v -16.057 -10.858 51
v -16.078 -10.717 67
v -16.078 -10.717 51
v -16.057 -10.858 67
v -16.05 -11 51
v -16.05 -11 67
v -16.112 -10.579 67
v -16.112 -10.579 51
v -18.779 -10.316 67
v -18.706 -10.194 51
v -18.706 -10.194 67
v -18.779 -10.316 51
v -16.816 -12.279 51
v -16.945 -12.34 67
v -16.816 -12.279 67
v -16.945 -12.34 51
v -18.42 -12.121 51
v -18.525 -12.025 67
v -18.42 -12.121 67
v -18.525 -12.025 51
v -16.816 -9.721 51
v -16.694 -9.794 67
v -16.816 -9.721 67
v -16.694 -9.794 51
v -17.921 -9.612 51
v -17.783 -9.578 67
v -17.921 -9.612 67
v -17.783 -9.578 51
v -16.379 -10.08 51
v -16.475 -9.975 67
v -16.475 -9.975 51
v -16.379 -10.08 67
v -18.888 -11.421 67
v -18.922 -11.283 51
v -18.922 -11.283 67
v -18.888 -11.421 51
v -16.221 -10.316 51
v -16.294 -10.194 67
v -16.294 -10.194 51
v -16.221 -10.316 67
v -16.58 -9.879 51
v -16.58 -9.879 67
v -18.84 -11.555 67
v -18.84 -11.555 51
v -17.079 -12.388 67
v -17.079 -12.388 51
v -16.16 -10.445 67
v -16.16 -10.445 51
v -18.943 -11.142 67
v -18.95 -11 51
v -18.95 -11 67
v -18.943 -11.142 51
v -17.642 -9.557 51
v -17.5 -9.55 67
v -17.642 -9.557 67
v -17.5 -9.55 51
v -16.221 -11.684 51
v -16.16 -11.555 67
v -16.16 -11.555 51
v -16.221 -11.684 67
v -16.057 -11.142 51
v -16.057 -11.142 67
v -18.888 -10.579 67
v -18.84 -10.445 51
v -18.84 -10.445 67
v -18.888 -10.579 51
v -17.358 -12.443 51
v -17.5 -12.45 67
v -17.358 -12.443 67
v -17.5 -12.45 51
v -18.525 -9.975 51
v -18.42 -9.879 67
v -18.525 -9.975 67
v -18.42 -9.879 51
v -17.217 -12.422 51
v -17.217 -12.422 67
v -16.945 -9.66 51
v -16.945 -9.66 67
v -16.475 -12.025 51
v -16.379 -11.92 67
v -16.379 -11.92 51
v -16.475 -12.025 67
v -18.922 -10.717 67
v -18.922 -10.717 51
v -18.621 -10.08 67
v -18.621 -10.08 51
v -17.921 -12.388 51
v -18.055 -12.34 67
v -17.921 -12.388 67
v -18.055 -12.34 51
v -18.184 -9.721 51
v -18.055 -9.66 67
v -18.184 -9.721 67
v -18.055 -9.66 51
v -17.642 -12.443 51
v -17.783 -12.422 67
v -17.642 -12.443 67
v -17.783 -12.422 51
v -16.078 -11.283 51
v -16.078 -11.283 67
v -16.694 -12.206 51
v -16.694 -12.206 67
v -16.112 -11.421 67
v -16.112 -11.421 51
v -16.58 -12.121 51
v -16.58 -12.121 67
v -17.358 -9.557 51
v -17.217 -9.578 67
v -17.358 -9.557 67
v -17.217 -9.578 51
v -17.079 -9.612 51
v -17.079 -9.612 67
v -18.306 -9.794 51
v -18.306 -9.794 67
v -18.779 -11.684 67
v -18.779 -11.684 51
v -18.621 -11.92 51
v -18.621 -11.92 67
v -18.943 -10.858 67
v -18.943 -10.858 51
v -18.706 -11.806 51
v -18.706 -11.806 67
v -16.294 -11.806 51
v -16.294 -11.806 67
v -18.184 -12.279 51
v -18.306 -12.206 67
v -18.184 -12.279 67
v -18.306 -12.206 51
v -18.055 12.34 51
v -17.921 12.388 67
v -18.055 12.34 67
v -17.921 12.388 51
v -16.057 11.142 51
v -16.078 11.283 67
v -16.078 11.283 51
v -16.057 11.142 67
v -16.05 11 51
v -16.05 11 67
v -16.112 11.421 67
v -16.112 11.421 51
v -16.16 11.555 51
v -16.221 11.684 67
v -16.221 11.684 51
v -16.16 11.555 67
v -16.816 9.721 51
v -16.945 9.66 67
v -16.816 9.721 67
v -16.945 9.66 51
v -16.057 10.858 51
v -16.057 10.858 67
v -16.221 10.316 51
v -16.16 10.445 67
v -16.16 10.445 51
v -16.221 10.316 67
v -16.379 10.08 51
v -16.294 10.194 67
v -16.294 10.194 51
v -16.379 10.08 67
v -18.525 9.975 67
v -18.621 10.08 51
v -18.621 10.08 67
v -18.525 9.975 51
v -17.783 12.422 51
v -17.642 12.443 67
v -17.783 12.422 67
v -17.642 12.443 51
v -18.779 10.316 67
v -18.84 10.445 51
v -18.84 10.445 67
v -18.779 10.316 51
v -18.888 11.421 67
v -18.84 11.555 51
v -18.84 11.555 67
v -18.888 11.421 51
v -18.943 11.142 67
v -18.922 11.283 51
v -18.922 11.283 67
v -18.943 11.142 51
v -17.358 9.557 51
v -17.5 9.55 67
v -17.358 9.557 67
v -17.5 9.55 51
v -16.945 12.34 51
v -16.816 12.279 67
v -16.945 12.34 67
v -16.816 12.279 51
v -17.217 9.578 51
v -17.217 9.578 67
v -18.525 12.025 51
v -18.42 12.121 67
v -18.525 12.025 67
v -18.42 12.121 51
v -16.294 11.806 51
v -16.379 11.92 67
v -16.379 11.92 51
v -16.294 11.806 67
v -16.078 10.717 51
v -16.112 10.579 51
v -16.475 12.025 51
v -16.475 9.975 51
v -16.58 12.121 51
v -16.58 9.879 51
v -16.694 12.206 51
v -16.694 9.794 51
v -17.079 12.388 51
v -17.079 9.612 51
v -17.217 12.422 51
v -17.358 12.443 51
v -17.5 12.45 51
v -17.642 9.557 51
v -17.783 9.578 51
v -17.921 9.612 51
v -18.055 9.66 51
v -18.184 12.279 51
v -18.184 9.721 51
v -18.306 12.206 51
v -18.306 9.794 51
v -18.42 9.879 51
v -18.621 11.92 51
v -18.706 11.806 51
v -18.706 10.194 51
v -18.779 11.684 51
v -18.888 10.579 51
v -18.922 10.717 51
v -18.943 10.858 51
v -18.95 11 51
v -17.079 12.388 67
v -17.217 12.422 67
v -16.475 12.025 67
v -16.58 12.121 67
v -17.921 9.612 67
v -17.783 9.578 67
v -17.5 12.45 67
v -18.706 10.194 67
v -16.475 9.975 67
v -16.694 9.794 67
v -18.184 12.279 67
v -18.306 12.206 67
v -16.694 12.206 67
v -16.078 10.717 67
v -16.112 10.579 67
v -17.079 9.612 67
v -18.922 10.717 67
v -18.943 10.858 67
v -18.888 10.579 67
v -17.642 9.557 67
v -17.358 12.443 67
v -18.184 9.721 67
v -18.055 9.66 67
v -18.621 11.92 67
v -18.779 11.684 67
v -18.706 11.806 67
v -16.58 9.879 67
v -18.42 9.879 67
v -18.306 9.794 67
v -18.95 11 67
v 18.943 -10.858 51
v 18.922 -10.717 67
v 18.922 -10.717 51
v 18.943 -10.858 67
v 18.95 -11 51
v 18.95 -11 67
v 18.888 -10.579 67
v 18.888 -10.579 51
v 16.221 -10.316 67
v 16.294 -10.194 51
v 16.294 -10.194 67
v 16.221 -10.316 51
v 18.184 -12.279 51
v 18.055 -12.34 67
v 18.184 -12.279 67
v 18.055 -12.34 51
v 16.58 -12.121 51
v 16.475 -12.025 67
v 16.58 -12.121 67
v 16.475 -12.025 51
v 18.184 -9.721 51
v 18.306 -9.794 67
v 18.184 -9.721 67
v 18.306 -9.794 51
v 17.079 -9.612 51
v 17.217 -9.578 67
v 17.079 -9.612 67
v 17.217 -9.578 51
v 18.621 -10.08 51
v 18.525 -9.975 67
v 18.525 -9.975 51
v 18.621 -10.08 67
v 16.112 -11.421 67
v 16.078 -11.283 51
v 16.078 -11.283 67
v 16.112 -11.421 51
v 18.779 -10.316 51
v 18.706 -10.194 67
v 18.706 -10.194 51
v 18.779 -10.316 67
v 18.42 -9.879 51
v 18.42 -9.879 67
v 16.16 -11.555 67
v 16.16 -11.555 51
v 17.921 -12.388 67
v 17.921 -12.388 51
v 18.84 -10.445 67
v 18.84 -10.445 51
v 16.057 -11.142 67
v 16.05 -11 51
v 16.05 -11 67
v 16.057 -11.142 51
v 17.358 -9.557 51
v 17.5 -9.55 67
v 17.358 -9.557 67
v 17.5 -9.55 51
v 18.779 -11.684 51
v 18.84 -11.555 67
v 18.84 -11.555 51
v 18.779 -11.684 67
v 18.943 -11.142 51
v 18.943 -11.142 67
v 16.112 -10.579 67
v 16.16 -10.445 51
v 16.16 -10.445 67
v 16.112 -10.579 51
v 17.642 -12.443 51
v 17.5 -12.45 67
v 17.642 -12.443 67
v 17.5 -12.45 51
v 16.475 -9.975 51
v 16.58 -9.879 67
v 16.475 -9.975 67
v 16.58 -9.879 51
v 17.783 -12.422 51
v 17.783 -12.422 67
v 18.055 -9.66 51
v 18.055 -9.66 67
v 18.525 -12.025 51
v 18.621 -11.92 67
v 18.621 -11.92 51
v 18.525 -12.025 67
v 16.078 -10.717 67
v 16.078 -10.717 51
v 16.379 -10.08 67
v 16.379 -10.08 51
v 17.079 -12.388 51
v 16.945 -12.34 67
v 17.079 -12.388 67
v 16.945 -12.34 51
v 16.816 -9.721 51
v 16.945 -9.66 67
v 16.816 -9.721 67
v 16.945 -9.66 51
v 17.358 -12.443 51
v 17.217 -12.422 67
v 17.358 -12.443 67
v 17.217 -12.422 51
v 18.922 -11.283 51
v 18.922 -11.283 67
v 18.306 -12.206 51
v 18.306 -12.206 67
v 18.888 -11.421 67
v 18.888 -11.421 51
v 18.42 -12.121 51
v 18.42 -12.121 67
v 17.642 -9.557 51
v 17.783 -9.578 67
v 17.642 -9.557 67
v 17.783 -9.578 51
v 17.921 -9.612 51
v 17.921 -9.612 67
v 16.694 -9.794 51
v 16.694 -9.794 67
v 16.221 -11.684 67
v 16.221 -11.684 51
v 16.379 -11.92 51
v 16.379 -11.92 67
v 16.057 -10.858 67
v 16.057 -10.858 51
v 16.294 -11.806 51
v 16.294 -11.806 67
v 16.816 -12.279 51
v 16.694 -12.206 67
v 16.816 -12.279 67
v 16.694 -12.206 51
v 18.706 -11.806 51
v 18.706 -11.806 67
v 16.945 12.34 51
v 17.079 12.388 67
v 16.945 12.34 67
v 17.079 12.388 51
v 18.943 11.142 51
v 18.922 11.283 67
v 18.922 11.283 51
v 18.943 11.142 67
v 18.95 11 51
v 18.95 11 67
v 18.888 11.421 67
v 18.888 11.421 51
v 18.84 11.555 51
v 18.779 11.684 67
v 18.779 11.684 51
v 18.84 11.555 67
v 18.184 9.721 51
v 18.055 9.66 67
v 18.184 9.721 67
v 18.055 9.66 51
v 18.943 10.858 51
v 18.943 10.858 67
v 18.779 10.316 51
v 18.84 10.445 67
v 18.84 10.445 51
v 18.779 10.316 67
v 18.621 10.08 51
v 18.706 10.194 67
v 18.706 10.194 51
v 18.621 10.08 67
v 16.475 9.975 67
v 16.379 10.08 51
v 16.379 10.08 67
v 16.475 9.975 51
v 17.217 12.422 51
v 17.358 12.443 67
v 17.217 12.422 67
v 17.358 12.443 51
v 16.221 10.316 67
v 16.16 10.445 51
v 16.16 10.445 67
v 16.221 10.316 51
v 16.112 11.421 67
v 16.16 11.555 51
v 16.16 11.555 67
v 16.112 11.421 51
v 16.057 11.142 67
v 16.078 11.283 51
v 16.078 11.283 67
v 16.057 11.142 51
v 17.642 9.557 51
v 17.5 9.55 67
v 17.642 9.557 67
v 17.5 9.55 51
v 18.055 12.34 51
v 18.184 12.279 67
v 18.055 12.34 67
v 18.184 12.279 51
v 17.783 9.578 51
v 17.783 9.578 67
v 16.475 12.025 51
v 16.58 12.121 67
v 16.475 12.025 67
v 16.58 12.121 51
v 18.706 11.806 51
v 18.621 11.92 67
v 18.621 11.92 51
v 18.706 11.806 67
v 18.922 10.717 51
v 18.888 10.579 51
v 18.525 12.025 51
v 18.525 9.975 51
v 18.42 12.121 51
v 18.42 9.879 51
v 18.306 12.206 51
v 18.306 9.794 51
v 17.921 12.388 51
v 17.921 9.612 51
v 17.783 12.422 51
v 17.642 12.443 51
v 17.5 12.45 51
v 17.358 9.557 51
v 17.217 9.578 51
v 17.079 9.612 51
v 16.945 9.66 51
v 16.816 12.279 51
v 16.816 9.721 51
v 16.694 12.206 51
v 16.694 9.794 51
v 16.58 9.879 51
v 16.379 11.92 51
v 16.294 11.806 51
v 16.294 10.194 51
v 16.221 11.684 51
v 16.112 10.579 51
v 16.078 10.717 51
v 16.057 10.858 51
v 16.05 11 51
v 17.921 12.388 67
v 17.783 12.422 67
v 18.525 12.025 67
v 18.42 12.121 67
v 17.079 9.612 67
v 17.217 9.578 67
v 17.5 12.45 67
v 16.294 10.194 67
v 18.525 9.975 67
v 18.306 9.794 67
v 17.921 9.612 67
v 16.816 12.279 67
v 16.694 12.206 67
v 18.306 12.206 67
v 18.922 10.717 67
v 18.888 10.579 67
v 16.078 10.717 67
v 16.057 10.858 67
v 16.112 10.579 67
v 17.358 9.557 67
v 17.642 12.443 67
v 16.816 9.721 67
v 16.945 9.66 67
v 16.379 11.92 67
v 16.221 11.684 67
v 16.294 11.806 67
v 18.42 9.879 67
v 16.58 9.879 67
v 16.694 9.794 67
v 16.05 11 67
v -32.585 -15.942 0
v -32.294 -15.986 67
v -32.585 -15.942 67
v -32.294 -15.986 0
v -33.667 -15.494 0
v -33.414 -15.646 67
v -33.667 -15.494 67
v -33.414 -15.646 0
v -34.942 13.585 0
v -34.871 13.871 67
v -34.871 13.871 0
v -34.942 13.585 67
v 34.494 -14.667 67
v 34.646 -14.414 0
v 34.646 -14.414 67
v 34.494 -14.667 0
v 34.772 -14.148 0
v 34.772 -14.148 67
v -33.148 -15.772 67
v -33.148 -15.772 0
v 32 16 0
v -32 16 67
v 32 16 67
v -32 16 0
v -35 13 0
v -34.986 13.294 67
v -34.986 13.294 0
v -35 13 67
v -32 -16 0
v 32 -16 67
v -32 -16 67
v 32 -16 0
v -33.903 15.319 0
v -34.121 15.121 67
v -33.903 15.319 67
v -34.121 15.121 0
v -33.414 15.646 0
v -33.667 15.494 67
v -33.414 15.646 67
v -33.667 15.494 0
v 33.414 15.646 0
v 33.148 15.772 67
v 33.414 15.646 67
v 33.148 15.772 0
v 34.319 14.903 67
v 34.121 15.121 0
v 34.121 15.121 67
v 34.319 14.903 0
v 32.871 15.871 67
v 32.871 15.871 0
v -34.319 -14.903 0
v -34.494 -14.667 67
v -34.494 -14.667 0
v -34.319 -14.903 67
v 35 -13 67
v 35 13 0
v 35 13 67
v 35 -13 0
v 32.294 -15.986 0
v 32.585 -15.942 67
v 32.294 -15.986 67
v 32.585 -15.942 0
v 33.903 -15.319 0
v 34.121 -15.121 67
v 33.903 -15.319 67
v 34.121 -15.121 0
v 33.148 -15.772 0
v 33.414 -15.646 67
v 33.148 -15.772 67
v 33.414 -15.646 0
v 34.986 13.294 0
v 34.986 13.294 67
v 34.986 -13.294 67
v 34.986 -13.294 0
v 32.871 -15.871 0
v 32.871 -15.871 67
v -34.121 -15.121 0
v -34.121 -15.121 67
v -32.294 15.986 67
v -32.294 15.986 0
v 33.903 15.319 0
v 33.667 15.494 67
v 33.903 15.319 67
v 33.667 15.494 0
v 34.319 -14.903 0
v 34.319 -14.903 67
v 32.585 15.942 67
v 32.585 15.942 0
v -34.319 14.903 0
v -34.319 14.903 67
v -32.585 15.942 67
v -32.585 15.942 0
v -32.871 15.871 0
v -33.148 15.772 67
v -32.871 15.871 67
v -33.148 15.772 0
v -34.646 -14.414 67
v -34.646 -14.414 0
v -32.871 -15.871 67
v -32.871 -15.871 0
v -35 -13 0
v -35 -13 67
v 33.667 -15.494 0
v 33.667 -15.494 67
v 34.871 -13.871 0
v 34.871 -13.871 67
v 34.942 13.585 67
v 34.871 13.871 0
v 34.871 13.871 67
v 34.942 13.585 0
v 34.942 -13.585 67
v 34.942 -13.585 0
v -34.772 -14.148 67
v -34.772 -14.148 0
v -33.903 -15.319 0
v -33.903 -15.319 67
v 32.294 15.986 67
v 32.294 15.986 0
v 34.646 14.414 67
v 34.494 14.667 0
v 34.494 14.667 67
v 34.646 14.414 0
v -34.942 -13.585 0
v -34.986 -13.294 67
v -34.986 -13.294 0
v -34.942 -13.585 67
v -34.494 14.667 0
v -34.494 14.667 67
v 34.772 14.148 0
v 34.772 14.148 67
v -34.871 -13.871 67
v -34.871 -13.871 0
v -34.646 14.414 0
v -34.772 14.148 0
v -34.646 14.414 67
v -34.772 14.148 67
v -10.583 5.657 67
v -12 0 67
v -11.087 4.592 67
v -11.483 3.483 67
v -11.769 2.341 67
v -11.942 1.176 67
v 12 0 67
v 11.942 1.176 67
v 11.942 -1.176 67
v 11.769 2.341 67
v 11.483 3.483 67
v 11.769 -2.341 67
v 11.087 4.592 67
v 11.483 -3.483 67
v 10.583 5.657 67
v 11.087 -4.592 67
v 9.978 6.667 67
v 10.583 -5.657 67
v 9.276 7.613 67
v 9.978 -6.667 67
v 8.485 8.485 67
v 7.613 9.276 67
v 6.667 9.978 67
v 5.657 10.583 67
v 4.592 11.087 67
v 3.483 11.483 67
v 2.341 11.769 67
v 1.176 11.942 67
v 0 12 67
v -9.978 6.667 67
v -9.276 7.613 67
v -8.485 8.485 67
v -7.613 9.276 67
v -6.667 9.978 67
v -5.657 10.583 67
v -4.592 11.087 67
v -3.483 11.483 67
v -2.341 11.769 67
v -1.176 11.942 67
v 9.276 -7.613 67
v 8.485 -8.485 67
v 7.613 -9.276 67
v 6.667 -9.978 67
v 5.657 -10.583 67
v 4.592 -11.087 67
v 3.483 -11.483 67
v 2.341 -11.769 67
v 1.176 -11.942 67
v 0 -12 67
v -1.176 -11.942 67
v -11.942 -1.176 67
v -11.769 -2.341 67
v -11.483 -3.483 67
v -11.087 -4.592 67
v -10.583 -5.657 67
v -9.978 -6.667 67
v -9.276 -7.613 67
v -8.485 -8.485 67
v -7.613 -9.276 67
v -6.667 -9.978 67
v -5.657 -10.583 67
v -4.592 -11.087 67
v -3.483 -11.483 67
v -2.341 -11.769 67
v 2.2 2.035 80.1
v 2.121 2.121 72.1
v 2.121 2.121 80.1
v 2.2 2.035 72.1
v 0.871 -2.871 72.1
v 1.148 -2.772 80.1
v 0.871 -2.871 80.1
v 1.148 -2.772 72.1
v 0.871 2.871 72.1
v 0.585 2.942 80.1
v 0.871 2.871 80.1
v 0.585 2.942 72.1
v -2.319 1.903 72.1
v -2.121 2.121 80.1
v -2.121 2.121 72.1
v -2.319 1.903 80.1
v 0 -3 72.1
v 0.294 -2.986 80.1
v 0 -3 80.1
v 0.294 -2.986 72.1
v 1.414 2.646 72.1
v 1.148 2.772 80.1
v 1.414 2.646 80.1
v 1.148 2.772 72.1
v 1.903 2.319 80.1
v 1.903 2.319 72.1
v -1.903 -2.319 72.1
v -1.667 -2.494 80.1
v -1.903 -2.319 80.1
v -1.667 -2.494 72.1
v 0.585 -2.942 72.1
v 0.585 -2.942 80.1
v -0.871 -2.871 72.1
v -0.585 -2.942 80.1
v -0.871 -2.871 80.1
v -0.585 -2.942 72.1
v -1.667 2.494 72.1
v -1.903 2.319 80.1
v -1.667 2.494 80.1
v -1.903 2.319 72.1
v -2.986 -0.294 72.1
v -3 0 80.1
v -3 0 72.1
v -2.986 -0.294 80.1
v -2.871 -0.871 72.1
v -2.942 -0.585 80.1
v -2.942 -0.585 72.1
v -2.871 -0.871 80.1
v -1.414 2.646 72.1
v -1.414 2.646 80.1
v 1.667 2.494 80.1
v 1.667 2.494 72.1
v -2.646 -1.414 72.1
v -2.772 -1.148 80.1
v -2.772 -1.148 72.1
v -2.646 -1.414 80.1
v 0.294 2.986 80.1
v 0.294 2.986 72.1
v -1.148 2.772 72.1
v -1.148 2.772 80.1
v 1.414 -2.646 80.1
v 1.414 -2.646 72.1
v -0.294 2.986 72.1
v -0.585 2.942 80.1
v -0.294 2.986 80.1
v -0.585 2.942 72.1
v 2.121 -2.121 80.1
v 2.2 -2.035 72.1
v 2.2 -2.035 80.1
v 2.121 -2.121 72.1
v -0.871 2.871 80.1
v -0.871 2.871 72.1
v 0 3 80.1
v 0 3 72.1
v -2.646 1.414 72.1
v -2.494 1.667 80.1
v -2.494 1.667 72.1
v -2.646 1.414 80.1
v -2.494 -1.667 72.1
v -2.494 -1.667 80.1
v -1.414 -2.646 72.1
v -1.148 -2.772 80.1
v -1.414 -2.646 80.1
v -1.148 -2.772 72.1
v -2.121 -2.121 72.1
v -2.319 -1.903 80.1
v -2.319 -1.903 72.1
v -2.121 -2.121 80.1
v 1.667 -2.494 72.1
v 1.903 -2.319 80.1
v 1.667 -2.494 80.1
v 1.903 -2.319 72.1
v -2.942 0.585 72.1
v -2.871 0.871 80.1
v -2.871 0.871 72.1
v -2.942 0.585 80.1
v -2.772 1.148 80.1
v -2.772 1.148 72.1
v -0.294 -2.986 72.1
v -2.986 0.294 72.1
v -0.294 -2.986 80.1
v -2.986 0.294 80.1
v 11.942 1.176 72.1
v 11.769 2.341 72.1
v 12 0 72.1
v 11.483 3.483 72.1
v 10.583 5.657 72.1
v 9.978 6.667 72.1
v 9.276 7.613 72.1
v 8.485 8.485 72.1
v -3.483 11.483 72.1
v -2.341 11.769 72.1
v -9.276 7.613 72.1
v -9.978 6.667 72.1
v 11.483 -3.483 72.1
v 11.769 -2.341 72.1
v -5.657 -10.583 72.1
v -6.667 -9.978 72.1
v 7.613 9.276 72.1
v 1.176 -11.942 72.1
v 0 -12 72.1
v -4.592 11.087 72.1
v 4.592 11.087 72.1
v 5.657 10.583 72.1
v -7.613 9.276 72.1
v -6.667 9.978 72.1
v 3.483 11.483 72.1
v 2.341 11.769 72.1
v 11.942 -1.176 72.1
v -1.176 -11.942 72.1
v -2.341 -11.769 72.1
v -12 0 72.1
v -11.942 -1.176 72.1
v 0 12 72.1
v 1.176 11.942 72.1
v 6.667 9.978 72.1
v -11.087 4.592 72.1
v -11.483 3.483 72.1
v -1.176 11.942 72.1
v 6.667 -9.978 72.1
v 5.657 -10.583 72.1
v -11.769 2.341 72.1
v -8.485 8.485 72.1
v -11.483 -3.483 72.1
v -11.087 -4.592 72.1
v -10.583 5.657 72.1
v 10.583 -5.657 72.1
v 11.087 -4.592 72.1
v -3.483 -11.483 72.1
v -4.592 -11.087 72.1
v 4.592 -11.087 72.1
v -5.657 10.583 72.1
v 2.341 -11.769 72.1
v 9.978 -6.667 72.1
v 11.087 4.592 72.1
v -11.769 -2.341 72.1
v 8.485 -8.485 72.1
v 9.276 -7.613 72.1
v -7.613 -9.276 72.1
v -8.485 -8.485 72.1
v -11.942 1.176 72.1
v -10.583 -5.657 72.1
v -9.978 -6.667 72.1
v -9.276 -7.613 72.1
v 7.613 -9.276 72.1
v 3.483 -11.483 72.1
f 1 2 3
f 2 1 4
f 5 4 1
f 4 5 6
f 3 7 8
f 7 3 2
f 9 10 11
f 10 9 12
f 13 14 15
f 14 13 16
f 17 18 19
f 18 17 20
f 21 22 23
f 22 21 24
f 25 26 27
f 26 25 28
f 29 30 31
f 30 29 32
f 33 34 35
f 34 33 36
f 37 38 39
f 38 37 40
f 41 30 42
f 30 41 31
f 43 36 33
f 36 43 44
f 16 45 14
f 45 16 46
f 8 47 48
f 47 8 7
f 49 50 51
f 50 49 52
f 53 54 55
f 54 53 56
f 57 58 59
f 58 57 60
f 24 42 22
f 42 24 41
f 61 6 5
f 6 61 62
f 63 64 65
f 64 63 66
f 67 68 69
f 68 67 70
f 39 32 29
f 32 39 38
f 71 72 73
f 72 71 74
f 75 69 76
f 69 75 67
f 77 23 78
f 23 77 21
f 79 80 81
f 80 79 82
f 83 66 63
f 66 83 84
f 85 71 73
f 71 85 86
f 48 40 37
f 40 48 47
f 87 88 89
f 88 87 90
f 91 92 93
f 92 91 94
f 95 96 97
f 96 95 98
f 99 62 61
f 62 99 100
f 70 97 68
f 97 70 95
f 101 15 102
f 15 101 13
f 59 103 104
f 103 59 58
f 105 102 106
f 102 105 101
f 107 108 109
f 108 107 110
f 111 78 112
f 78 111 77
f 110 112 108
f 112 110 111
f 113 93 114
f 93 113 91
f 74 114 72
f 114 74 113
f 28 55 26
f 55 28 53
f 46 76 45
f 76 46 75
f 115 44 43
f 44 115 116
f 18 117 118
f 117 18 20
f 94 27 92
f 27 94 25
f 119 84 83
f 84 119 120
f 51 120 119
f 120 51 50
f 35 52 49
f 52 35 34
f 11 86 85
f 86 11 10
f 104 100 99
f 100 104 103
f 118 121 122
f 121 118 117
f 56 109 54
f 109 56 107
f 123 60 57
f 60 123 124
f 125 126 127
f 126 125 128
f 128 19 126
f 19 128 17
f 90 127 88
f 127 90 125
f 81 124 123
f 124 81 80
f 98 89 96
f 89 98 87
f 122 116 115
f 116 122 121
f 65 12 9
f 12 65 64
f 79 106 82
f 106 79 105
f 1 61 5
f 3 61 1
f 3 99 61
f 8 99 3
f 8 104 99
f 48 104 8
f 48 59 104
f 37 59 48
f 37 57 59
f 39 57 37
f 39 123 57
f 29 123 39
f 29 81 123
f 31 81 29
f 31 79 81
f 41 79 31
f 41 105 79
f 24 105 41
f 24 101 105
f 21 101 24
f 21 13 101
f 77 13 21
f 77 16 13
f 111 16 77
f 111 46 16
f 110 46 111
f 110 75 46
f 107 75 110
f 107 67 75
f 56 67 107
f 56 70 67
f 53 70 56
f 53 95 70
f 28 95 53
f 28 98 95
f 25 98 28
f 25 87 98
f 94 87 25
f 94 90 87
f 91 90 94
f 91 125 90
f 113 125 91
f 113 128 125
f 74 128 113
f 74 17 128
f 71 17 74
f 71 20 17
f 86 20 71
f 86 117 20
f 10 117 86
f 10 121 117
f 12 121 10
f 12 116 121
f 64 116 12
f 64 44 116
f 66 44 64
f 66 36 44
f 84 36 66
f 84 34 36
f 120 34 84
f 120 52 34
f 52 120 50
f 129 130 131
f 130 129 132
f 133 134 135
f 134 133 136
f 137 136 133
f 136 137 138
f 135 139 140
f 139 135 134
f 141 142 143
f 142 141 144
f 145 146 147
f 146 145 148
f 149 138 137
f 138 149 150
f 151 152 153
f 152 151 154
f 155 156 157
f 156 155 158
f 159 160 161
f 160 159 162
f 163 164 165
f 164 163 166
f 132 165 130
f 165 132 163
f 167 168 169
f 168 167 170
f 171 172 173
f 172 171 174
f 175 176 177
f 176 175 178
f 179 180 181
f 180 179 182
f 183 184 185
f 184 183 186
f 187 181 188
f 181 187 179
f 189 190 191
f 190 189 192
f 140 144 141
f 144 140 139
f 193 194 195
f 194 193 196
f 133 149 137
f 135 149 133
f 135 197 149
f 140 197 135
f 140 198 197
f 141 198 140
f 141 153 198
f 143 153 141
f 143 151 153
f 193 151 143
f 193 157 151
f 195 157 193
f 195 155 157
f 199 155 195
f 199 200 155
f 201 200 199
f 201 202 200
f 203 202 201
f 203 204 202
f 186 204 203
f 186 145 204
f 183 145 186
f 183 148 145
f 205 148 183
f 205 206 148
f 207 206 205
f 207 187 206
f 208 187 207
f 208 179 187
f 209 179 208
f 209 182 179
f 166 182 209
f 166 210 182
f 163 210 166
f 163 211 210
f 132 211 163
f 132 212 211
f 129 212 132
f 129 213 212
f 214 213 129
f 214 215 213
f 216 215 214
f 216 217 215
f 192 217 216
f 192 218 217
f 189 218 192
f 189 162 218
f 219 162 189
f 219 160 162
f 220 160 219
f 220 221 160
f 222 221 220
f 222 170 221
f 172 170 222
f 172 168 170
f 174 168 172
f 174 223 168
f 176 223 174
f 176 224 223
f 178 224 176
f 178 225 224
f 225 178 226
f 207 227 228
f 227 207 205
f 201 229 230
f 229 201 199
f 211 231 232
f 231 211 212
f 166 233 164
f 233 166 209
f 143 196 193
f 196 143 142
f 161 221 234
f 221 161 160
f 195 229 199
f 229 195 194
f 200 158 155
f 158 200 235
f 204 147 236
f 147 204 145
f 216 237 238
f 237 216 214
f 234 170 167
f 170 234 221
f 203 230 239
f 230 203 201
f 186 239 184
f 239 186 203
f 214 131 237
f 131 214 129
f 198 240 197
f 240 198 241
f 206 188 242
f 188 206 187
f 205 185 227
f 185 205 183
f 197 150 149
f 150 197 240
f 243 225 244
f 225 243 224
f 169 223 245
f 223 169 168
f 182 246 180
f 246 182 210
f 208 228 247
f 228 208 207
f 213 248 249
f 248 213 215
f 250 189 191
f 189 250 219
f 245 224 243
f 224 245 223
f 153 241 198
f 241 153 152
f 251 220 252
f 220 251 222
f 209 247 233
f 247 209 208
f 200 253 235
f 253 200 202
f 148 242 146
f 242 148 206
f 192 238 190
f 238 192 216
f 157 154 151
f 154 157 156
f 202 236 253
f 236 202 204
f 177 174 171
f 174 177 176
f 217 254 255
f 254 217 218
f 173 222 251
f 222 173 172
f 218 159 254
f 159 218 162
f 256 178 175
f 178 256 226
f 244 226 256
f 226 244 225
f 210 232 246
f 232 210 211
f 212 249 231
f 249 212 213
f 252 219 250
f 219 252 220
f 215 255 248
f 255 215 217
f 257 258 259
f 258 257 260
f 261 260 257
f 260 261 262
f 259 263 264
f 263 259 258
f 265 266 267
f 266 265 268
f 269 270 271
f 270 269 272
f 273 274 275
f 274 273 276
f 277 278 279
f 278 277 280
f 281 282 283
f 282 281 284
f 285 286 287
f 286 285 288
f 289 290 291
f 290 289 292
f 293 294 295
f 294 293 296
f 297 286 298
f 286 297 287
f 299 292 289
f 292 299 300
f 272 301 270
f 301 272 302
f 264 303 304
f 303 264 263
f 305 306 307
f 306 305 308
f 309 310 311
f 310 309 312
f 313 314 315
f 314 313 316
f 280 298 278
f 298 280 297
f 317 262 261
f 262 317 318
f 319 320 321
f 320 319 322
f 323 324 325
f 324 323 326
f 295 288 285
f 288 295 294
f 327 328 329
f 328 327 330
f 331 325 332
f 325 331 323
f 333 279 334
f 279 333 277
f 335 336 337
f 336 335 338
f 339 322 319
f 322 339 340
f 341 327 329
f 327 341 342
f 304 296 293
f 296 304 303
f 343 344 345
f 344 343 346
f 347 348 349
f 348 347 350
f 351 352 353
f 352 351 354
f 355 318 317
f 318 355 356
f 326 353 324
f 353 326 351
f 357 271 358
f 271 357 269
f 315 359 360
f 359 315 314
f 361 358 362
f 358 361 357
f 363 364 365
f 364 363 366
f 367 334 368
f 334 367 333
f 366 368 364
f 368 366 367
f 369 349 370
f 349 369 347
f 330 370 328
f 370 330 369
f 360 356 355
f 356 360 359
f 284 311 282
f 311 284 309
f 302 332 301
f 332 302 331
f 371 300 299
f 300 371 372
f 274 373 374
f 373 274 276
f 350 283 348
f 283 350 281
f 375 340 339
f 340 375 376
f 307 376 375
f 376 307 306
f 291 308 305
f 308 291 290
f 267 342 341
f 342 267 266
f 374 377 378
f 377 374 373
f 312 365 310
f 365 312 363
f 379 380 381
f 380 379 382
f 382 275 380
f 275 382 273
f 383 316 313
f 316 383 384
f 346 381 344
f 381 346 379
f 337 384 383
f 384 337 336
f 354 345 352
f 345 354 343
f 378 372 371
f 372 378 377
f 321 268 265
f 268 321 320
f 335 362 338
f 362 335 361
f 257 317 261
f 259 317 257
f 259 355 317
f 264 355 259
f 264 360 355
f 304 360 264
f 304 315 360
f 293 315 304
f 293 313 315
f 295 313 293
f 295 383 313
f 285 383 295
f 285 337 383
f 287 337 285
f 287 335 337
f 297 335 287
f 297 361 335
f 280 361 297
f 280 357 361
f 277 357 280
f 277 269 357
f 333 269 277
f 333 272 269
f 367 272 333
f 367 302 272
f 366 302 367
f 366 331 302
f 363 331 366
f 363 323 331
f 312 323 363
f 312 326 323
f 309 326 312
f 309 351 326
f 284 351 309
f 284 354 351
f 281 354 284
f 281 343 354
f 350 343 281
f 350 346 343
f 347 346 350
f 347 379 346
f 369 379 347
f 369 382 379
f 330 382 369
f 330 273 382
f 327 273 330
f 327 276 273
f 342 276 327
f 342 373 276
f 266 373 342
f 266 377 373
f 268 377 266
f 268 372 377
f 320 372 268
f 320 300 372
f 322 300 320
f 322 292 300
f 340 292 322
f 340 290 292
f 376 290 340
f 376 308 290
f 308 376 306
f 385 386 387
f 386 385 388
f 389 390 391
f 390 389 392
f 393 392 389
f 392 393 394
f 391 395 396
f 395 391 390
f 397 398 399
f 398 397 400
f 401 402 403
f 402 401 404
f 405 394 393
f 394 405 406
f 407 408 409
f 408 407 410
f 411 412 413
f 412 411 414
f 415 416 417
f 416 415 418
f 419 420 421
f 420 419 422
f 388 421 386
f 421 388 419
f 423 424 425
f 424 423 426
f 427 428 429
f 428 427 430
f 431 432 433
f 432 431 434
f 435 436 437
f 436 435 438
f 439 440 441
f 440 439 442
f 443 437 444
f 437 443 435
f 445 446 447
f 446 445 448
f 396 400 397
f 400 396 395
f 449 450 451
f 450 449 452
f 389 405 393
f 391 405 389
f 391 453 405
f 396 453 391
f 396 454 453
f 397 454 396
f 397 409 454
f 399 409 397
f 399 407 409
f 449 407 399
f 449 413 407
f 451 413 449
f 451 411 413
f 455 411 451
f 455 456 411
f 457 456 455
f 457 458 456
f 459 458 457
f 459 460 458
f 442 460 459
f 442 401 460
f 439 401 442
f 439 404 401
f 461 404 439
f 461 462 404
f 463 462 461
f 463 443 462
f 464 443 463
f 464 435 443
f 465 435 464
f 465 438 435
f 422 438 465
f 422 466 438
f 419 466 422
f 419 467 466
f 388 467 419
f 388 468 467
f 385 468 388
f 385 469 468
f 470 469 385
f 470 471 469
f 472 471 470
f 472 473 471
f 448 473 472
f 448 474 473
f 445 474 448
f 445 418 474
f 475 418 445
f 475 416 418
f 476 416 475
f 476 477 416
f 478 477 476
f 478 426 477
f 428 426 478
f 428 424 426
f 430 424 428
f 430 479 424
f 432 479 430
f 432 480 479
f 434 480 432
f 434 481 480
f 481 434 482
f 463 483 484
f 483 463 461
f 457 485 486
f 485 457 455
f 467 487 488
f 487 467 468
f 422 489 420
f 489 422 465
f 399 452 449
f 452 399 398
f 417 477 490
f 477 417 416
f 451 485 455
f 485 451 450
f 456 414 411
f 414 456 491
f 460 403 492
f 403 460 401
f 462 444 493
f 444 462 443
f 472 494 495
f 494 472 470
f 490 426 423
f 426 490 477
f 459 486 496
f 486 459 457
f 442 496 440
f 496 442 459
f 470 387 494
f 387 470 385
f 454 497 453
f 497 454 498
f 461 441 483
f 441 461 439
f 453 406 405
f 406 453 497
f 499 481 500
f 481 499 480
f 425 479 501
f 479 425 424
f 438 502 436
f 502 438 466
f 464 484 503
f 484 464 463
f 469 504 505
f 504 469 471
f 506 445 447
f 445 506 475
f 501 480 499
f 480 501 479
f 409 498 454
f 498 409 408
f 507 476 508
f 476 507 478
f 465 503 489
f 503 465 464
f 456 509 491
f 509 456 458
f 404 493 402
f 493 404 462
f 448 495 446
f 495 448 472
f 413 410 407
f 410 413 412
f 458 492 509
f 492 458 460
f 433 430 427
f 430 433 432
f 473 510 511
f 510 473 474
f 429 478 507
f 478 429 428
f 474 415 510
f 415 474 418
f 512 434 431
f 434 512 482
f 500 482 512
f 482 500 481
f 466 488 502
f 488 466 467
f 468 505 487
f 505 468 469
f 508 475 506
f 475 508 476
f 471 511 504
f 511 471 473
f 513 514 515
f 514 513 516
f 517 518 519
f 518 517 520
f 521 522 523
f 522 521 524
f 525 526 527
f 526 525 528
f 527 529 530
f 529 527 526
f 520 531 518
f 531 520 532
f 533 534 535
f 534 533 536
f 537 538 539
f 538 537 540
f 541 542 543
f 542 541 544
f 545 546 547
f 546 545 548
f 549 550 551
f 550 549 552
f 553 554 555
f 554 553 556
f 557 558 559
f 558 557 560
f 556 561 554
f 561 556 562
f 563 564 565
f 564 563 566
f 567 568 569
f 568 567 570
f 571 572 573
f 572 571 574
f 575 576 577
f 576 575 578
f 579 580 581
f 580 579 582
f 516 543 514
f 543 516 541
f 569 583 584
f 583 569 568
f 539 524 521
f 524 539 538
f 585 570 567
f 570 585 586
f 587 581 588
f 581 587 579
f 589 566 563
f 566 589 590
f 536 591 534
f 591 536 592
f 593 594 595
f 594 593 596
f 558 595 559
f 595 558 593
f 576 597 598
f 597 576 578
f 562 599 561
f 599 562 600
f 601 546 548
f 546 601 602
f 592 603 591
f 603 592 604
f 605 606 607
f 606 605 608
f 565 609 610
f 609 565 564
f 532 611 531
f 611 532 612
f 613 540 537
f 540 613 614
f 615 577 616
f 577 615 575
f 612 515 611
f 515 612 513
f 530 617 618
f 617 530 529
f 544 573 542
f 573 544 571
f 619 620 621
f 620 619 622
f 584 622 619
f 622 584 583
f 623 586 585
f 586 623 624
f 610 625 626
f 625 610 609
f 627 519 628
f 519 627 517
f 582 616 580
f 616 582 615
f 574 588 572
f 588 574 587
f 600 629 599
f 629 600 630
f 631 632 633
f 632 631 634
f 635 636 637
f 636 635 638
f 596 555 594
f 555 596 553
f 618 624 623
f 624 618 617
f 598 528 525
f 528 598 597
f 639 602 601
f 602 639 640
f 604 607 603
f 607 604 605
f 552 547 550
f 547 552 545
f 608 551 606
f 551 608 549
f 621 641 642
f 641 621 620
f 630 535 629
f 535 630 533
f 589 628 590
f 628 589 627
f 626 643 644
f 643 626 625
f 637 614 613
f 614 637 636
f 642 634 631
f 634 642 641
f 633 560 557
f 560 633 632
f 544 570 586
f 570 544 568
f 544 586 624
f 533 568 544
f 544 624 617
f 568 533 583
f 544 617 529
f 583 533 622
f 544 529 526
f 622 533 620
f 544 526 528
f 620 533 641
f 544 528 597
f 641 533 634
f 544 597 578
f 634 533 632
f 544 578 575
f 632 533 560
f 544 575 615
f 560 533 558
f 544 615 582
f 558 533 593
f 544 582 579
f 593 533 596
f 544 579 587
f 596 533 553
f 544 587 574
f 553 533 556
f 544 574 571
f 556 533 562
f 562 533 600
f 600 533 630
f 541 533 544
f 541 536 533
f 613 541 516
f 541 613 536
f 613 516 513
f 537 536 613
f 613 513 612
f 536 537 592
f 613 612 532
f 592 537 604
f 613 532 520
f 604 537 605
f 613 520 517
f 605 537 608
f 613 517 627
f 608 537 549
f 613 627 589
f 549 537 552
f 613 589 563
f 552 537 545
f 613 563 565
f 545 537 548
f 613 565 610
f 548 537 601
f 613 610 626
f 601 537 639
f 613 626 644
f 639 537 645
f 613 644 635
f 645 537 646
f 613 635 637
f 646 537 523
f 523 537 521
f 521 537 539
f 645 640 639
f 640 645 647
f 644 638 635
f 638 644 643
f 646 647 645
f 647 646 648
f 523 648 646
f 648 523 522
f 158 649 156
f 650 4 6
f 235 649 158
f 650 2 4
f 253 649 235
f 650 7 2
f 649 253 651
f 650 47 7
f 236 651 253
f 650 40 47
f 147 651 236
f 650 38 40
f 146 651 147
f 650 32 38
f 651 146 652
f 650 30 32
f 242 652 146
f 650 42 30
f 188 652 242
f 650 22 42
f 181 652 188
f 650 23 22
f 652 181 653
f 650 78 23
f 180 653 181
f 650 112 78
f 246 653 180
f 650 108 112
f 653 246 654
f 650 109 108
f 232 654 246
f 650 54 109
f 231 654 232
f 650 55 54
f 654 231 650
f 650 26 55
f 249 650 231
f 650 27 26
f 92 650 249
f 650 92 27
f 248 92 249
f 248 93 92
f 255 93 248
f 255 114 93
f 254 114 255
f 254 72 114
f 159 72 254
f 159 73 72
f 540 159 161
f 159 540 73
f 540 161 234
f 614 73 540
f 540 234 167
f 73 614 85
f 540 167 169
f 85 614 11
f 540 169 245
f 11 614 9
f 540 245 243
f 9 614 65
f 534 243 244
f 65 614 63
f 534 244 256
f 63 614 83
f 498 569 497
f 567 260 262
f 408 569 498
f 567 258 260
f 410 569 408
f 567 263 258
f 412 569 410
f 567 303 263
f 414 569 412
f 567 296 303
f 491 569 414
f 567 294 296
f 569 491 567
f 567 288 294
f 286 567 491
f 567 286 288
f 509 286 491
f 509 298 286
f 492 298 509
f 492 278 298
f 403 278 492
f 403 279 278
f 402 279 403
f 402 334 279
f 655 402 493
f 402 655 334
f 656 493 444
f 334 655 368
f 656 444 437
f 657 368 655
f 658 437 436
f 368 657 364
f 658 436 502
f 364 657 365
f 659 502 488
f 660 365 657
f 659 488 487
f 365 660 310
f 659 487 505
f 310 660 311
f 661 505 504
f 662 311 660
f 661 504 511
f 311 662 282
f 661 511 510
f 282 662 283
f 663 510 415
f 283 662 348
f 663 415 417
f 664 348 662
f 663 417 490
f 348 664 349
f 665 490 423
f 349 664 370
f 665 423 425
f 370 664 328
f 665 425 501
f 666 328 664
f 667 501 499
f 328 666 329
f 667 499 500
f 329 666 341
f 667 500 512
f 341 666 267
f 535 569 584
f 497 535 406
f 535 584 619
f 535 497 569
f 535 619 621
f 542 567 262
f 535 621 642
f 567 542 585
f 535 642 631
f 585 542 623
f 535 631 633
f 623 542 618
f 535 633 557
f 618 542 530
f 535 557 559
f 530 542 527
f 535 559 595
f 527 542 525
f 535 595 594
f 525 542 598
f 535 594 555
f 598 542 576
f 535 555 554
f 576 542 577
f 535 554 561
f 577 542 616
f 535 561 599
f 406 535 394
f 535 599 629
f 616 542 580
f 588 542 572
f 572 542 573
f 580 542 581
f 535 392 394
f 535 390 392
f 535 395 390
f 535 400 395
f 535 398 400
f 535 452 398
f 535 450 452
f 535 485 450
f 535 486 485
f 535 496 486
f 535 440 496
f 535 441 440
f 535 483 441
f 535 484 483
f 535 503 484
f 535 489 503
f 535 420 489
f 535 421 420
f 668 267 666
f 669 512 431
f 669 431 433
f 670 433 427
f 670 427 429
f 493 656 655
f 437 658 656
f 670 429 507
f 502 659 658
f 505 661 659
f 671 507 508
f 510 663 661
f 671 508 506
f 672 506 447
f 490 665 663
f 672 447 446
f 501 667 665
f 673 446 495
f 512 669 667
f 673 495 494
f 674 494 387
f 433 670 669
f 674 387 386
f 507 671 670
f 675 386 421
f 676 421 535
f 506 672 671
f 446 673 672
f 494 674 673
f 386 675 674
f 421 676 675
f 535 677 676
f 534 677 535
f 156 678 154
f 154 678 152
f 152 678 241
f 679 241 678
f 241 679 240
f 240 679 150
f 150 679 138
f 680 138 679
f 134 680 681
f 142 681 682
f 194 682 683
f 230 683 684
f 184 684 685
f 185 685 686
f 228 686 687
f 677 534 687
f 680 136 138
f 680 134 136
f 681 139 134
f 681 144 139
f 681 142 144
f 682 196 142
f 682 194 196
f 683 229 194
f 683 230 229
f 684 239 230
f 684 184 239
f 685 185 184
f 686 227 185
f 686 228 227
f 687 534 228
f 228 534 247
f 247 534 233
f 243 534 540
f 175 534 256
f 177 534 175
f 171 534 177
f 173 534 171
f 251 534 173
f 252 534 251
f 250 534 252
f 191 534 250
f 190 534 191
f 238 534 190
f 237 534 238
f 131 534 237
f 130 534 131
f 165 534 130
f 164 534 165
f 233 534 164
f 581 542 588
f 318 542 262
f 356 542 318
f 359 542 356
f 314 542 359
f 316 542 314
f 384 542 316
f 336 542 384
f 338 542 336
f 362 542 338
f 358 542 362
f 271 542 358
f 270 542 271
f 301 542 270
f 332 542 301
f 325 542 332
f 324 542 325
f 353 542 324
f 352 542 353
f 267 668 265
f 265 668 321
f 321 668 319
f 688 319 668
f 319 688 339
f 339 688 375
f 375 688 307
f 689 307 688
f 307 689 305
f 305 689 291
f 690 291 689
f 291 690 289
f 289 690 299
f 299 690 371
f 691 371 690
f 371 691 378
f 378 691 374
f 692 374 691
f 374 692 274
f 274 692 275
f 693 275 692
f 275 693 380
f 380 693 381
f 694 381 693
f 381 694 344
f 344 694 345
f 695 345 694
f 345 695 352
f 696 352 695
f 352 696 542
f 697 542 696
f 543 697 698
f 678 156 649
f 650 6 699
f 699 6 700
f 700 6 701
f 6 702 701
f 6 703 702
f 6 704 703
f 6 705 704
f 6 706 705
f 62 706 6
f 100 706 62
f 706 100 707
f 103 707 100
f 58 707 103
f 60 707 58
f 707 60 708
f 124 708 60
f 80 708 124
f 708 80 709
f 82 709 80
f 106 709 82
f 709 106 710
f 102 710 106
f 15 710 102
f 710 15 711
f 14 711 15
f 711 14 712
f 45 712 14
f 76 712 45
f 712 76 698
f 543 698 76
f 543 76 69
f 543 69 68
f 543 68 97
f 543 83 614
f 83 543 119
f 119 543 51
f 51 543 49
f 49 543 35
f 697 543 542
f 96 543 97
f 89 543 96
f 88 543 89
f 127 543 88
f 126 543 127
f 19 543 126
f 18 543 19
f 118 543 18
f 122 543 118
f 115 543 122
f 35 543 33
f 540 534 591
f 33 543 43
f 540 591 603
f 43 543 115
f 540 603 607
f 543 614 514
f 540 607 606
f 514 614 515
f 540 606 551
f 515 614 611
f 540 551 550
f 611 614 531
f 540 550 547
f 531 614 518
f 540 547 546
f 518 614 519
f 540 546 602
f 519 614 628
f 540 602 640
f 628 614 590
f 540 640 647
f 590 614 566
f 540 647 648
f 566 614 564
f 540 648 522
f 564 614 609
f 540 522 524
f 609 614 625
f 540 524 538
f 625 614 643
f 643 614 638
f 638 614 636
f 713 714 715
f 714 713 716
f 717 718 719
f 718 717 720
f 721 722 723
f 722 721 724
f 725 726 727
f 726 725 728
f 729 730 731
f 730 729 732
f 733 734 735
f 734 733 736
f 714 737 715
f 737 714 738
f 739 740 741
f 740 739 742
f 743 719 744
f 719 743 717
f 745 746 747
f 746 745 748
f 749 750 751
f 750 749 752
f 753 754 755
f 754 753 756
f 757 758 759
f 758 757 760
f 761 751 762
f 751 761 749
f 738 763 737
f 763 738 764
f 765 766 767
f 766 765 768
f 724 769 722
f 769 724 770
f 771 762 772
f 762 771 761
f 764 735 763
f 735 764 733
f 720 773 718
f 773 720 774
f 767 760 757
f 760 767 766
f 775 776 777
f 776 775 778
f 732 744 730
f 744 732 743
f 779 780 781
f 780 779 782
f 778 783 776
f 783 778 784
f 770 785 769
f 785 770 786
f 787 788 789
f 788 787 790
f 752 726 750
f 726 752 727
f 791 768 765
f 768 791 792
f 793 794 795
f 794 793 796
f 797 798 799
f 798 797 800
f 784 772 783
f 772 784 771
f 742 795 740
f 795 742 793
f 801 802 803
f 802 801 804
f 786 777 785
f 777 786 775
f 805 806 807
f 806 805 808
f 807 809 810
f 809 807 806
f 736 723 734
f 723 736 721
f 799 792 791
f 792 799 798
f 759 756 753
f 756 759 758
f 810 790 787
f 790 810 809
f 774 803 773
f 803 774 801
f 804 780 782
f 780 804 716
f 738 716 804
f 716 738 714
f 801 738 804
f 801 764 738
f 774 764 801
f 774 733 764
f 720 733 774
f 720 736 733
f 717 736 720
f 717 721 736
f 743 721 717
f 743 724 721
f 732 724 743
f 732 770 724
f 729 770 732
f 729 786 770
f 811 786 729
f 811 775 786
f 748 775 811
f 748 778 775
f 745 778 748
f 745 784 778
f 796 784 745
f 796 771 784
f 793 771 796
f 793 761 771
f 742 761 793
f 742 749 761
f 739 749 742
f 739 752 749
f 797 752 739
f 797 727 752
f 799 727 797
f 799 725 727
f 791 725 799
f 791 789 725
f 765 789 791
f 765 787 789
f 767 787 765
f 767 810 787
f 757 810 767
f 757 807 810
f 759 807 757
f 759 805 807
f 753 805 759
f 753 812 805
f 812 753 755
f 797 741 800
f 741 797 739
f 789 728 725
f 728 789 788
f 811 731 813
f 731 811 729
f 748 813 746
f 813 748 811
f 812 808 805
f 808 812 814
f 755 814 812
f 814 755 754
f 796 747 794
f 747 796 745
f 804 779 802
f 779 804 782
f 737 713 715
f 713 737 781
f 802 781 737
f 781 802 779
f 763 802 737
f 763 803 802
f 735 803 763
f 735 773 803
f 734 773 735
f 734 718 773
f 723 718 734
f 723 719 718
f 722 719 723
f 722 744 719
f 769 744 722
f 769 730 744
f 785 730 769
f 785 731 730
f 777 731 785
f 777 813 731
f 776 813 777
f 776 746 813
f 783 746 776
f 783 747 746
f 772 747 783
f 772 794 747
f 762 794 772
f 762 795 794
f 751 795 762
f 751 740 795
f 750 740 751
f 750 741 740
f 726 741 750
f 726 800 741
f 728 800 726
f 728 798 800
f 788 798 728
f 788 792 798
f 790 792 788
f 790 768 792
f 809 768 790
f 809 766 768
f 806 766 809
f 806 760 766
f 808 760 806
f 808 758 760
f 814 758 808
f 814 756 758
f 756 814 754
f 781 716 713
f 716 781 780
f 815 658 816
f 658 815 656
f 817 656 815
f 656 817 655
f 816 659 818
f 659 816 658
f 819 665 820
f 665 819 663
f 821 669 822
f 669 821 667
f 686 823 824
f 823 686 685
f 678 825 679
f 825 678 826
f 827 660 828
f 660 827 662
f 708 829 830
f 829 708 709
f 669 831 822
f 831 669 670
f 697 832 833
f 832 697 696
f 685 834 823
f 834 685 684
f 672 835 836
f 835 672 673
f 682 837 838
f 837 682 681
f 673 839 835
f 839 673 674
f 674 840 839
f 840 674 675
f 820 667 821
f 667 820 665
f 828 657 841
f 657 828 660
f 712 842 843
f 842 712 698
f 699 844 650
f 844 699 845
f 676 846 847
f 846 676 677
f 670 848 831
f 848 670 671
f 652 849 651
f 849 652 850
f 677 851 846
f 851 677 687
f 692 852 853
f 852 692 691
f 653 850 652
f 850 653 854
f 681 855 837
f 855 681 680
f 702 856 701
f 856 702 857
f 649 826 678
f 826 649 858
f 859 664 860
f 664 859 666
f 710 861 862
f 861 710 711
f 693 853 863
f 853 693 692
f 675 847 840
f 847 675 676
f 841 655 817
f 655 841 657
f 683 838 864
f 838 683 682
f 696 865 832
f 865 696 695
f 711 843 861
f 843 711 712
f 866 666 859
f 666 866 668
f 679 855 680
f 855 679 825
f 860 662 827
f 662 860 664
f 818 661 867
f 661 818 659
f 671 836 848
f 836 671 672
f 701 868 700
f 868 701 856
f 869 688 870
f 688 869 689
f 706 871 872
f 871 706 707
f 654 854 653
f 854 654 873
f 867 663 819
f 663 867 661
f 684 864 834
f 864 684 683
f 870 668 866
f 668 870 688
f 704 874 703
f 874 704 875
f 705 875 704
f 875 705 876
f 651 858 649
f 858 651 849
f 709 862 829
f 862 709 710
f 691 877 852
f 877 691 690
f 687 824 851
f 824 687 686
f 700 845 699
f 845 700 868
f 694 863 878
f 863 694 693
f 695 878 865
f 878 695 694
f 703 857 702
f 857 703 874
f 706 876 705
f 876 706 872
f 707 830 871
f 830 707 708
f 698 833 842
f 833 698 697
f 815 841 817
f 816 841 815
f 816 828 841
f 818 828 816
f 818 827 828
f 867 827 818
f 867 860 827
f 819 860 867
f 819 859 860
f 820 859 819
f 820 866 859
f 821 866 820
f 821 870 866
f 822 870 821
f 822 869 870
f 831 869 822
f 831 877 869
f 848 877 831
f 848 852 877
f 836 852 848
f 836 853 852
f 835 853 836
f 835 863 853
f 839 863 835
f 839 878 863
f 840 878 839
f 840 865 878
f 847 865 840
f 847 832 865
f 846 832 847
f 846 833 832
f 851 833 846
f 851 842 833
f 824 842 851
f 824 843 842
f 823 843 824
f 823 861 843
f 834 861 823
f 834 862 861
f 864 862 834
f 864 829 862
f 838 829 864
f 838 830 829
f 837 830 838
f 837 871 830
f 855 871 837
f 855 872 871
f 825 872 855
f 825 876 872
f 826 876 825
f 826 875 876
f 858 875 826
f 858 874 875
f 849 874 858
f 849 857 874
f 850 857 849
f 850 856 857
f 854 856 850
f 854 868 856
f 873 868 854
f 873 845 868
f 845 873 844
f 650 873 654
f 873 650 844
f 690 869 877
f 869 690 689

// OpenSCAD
/*
  Blue Trail Engineering SER-203x / SER-213x dimensional package proxy.

  Use for early mount-envelope studies only. This is not manufacturer CAD.
  The housing envelope, top mounting-hole pattern, shaft diameter/length and
  24 mm top feature are taken from the manufacturer's dimension drawing. The
  Cobalt connector, side through-hole location, exact corner radii, hub/boss
  stack and D-flat geometry are not fully defined here; replace this proxy with
  the vendor STEP from the November 2026 archive before detailed integration.
  Units: mm. Coordinate origin: bottom center of the nominal housing.
  Source: Blue Trail Engineering SER-2XXX datasheet Rev. 2.1 (Oct. 2026),
  https://www.bluetrailengineering.com/_files/ugd/e4c7c5_f6ed898cfb8e4f18b432bcfd0b5dd3fb.pdf?index=true
*/

body_length = 70.0;
body_width = 32.0;
body_height = 67.0;
overall_height_to_shaft_tip = 80.1;
shaft_diameter = 6.0;
shaft_length = 8.0;
top_feature_diameter = 24.0;
top_feature_height = overall_height_to_shaft_tip-body_height-shaft_length;

top_mount_hole_spacing_x = 35.0;
top_mount_hole_spacing_y = 22.0;
top_mount_hole_diameter = 2.9;
top_mount_hole_depth = 16.0;
top_mount_screw_note = "#6 or M3.5 self-tapping; verify actual screw";

// Visual placeholders, not dimensioned vendor interfaces.
housing_corner_radius = 3.0;
d_flat_depth_placeholder = 0.8;
include_top_mount_holes = true;
include_proxy_d_flat = true;
part_view = "package"; // [package,housing_only,top_feature_and_shaft,top_mount_pattern]
$fn = 64;

assert(body_length > 0 && body_width > 0 && body_height > 0,
       "Housing dimensions must be positive");
assert(top_feature_height > 0,
       "The current drawing dimensions must leave a positive top feature height");
assert(shaft_diameter > 0 && shaft_length > 0,
       "Shaft dimensions must be positive");

module rounded_housing() {
    r = min(housing_corner_radius, body_width/2-0.01, body_length/2-0.01);
    hull()
        for (x=[-body_length/2+r,body_length/2-r],
             y=[-body_width/2+r,body_width/2-r])
            translate([x,y,0]) cylinder(r=r,h=body_height);
}

module housing() {
    difference() {
        rounded_housing();
        if (include_top_mount_holes)
            for (x=[-top_mount_hole_spacing_x/2,top_mount_hole_spacing_x/2],
                 y=[-top_mount_hole_spacing_y/2,top_mount_hole_spacing_y/2])
                translate([x,y,body_height-top_mount_hole_depth])
                    cylinder(d=top_mount_hole_diameter,
                             h=top_mount_hole_depth+0.02);
    }
}

module top_feature() {
    translate([0,0,body_height])
        cylinder(d=top_feature_diameter,h=top_feature_height);
}

module d_shaft() {
    translate([0,0,body_height+top_feature_height])
        difference() {
            cylinder(d=shaft_diameter,h=shaft_length);
            if (include_proxy_d_flat)
                translate([shaft_diameter/2-d_flat_depth_placeholder,
                           -shaft_diameter,-0.01])
                    cube([shaft_diameter,2*shaft_diameter,shaft_length+0.02]);
        }
}

module package() {
    color([0.25,0.28,0.32]) housing();
    color([0.36,0.39,0.43]) top_feature();
    color([0.72,0.74,0.77]) d_shaft();
}

module top_mount_pattern() {
    for (x=[-top_mount_hole_spacing_x/2,top_mount_hole_spacing_x/2],
         y=[-top_mount_hole_spacing_y/2,top_mount_hole_spacing_y/2])
        translate([x,y,body_height-top_mount_hole_depth])
            cylinder(d=top_mount_hole_diameter,h=top_mount_hole_depth);
}

echo("SER-203x/SER-213x early dimensional proxy only; verify vendor STEP before mount/coupler release.");
echo("Housing envelope = 70 x 32 x 67 mm; shaft tip z = 80.1 mm; connector and side-hole interfaces are omitted.");
echo("Top face: four Ø2.9 x 16 mm holes on 35 x 22 mm pattern; confirm screw and vendor STEP.");
echo("D-flat depth and corner radii are visual placeholders, not confirmed interfaces.");

if (part_view == "package") package();
else if (part_view == "housing_only") housing();
else if (part_view == "top_feature_and_shaft") { top_feature(); d_shaft(); }
else if (part_view == "top_mount_pattern") top_mount_pattern();
else assert(false,"Unknown part_view selector");
